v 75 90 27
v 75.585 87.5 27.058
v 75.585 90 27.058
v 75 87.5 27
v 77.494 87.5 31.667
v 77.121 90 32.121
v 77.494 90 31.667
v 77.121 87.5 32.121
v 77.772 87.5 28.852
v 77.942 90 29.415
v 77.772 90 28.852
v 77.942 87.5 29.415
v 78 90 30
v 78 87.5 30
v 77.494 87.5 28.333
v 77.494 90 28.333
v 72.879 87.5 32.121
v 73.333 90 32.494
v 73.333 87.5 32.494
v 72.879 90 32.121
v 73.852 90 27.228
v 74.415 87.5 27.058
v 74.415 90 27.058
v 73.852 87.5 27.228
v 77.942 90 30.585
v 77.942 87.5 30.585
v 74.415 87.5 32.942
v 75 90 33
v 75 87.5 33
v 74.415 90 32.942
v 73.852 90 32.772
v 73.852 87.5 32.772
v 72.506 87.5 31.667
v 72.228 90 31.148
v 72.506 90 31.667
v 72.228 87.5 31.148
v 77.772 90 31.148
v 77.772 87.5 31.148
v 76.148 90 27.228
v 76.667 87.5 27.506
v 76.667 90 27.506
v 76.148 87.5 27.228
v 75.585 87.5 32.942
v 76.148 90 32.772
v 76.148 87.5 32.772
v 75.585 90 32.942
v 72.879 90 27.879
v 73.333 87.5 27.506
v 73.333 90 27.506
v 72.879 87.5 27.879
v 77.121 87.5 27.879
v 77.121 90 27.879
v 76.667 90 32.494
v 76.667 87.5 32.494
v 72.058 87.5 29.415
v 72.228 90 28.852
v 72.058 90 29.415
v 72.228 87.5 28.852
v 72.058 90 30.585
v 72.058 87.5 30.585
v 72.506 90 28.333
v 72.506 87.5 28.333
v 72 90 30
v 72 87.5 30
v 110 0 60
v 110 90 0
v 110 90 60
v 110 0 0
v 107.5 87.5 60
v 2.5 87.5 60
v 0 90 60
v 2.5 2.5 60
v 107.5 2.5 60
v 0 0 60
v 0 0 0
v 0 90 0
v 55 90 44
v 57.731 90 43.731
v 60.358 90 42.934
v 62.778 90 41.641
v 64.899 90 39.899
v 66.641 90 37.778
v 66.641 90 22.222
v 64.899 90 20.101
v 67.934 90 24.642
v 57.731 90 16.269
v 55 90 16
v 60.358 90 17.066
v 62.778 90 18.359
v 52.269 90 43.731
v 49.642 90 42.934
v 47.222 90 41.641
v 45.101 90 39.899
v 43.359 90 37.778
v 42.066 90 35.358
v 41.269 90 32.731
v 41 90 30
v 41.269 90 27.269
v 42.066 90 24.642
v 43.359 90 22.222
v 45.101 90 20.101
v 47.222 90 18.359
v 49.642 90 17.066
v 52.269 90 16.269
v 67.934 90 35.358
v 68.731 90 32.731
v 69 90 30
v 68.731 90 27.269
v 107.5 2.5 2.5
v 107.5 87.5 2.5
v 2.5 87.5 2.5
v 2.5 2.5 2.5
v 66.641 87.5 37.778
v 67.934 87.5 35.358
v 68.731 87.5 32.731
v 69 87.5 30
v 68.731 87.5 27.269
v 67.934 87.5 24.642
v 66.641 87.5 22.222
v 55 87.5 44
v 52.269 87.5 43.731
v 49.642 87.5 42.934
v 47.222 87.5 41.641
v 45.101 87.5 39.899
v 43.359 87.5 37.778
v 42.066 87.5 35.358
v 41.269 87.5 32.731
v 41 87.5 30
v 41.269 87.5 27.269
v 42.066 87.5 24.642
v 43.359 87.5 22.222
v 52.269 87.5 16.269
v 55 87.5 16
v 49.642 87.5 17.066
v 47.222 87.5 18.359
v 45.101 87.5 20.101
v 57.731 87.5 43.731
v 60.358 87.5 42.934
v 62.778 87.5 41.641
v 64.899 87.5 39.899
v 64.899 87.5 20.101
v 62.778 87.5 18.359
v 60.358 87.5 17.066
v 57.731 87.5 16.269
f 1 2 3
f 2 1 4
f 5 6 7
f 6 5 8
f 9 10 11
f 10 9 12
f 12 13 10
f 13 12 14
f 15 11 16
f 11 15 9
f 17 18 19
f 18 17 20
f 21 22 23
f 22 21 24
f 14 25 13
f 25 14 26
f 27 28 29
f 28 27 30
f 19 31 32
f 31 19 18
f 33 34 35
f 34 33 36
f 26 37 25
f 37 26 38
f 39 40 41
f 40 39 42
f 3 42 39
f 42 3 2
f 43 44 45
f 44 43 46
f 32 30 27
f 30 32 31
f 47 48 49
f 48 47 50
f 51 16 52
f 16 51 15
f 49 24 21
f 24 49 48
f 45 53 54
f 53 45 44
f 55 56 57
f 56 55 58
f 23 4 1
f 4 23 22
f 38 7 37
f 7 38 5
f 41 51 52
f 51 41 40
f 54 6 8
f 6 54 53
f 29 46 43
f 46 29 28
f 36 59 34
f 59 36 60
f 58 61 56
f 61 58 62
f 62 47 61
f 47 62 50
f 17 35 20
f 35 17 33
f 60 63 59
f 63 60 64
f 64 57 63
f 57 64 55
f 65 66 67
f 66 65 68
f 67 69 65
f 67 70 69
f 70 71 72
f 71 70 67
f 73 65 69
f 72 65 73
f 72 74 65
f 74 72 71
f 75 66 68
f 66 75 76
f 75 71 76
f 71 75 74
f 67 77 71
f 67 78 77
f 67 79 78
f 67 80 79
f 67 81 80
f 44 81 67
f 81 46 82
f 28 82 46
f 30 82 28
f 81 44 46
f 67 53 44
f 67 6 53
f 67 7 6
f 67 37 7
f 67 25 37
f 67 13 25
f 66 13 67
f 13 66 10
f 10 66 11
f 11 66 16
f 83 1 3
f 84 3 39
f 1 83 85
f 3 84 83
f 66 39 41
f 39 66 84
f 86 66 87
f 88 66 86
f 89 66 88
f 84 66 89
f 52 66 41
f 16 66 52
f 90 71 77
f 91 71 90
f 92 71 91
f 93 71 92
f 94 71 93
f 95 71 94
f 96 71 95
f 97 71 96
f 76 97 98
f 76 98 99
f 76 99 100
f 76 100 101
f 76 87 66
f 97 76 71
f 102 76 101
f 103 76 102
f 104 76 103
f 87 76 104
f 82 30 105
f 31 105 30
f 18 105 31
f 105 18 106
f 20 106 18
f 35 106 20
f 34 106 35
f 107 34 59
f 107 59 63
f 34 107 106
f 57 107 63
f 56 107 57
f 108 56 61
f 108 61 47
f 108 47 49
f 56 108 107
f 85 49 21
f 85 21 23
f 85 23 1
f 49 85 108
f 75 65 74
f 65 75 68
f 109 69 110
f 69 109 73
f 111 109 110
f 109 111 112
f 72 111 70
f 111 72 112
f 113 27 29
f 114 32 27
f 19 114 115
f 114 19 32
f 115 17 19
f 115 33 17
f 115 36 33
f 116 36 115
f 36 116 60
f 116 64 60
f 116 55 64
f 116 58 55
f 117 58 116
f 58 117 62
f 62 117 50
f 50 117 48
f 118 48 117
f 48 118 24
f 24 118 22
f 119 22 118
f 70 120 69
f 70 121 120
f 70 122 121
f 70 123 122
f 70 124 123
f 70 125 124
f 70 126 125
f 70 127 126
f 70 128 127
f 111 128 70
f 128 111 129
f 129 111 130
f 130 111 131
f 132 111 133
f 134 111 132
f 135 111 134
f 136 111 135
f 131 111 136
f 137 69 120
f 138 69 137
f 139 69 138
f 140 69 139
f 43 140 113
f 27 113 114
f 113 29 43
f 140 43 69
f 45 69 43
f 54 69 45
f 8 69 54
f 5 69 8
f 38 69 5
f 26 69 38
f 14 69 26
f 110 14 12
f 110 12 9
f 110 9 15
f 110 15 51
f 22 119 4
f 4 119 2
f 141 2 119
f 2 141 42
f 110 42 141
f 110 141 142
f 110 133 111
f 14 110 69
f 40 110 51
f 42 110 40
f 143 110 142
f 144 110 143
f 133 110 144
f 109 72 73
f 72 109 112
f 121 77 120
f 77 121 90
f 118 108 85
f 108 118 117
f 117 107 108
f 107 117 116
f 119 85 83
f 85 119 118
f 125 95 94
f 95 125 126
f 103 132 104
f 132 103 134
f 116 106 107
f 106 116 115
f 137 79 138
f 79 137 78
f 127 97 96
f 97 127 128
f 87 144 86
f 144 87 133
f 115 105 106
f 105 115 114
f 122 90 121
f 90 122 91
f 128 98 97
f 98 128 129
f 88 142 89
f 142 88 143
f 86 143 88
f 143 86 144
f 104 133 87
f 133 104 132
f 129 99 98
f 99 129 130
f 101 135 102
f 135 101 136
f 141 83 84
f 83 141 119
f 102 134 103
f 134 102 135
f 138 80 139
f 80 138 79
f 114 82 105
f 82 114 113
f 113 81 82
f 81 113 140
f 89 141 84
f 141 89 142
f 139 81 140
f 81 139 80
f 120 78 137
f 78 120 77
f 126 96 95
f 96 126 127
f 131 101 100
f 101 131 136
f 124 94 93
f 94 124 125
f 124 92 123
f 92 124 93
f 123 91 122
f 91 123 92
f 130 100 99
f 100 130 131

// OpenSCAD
$fn = 32;

// ----------------------------------------------------------------------
// Vent box: roundvent enclosure
// ----------------------------------------------------------------------

// --- parameters (mm) ---
box_l = 110;              // box length, X
box_w = 90;               // box width, Y
box_h = 60;               // box height, Z
wall_t = 2.5;             // shell wall thickness
vent_d = 28;              // central vent diameter
ring_d = 6;               // ring hole diameter
n_ring = 6;               // holes in the ring
ring_r = 20;              // ring radius
fit_tol = 0.05;           // tolerance for press fits, mm
free_tol = 0.2;           // tolerance for clearance fits, mm

ring_step = 360 / n_ring;  // ring hole angular step

difference() {
  cube([box_l, box_w, box_h]);
  translate([wall_t, wall_t, wall_t])
    cube([box_l - 2 * wall_t, box_w - 2 * wall_t, box_h]);
  translate([box_l / 2, box_w - wall_t - 1, box_h / 2])
    rotate([-90, 0, 0]) cylinder(h = wall_t + 2, d = vent_d);
  for (i = [0 : n_ring - 1])
    translate([box_l / 2, box_w - wall_t - 1, box_h / 2])
      rotate([0, 0, i * ring_step])
        translate([ring_r, 0, 0]) rotate([-90, 0, 0])
          cylinder(h = wall_t + 2, d = ring_d);
}
